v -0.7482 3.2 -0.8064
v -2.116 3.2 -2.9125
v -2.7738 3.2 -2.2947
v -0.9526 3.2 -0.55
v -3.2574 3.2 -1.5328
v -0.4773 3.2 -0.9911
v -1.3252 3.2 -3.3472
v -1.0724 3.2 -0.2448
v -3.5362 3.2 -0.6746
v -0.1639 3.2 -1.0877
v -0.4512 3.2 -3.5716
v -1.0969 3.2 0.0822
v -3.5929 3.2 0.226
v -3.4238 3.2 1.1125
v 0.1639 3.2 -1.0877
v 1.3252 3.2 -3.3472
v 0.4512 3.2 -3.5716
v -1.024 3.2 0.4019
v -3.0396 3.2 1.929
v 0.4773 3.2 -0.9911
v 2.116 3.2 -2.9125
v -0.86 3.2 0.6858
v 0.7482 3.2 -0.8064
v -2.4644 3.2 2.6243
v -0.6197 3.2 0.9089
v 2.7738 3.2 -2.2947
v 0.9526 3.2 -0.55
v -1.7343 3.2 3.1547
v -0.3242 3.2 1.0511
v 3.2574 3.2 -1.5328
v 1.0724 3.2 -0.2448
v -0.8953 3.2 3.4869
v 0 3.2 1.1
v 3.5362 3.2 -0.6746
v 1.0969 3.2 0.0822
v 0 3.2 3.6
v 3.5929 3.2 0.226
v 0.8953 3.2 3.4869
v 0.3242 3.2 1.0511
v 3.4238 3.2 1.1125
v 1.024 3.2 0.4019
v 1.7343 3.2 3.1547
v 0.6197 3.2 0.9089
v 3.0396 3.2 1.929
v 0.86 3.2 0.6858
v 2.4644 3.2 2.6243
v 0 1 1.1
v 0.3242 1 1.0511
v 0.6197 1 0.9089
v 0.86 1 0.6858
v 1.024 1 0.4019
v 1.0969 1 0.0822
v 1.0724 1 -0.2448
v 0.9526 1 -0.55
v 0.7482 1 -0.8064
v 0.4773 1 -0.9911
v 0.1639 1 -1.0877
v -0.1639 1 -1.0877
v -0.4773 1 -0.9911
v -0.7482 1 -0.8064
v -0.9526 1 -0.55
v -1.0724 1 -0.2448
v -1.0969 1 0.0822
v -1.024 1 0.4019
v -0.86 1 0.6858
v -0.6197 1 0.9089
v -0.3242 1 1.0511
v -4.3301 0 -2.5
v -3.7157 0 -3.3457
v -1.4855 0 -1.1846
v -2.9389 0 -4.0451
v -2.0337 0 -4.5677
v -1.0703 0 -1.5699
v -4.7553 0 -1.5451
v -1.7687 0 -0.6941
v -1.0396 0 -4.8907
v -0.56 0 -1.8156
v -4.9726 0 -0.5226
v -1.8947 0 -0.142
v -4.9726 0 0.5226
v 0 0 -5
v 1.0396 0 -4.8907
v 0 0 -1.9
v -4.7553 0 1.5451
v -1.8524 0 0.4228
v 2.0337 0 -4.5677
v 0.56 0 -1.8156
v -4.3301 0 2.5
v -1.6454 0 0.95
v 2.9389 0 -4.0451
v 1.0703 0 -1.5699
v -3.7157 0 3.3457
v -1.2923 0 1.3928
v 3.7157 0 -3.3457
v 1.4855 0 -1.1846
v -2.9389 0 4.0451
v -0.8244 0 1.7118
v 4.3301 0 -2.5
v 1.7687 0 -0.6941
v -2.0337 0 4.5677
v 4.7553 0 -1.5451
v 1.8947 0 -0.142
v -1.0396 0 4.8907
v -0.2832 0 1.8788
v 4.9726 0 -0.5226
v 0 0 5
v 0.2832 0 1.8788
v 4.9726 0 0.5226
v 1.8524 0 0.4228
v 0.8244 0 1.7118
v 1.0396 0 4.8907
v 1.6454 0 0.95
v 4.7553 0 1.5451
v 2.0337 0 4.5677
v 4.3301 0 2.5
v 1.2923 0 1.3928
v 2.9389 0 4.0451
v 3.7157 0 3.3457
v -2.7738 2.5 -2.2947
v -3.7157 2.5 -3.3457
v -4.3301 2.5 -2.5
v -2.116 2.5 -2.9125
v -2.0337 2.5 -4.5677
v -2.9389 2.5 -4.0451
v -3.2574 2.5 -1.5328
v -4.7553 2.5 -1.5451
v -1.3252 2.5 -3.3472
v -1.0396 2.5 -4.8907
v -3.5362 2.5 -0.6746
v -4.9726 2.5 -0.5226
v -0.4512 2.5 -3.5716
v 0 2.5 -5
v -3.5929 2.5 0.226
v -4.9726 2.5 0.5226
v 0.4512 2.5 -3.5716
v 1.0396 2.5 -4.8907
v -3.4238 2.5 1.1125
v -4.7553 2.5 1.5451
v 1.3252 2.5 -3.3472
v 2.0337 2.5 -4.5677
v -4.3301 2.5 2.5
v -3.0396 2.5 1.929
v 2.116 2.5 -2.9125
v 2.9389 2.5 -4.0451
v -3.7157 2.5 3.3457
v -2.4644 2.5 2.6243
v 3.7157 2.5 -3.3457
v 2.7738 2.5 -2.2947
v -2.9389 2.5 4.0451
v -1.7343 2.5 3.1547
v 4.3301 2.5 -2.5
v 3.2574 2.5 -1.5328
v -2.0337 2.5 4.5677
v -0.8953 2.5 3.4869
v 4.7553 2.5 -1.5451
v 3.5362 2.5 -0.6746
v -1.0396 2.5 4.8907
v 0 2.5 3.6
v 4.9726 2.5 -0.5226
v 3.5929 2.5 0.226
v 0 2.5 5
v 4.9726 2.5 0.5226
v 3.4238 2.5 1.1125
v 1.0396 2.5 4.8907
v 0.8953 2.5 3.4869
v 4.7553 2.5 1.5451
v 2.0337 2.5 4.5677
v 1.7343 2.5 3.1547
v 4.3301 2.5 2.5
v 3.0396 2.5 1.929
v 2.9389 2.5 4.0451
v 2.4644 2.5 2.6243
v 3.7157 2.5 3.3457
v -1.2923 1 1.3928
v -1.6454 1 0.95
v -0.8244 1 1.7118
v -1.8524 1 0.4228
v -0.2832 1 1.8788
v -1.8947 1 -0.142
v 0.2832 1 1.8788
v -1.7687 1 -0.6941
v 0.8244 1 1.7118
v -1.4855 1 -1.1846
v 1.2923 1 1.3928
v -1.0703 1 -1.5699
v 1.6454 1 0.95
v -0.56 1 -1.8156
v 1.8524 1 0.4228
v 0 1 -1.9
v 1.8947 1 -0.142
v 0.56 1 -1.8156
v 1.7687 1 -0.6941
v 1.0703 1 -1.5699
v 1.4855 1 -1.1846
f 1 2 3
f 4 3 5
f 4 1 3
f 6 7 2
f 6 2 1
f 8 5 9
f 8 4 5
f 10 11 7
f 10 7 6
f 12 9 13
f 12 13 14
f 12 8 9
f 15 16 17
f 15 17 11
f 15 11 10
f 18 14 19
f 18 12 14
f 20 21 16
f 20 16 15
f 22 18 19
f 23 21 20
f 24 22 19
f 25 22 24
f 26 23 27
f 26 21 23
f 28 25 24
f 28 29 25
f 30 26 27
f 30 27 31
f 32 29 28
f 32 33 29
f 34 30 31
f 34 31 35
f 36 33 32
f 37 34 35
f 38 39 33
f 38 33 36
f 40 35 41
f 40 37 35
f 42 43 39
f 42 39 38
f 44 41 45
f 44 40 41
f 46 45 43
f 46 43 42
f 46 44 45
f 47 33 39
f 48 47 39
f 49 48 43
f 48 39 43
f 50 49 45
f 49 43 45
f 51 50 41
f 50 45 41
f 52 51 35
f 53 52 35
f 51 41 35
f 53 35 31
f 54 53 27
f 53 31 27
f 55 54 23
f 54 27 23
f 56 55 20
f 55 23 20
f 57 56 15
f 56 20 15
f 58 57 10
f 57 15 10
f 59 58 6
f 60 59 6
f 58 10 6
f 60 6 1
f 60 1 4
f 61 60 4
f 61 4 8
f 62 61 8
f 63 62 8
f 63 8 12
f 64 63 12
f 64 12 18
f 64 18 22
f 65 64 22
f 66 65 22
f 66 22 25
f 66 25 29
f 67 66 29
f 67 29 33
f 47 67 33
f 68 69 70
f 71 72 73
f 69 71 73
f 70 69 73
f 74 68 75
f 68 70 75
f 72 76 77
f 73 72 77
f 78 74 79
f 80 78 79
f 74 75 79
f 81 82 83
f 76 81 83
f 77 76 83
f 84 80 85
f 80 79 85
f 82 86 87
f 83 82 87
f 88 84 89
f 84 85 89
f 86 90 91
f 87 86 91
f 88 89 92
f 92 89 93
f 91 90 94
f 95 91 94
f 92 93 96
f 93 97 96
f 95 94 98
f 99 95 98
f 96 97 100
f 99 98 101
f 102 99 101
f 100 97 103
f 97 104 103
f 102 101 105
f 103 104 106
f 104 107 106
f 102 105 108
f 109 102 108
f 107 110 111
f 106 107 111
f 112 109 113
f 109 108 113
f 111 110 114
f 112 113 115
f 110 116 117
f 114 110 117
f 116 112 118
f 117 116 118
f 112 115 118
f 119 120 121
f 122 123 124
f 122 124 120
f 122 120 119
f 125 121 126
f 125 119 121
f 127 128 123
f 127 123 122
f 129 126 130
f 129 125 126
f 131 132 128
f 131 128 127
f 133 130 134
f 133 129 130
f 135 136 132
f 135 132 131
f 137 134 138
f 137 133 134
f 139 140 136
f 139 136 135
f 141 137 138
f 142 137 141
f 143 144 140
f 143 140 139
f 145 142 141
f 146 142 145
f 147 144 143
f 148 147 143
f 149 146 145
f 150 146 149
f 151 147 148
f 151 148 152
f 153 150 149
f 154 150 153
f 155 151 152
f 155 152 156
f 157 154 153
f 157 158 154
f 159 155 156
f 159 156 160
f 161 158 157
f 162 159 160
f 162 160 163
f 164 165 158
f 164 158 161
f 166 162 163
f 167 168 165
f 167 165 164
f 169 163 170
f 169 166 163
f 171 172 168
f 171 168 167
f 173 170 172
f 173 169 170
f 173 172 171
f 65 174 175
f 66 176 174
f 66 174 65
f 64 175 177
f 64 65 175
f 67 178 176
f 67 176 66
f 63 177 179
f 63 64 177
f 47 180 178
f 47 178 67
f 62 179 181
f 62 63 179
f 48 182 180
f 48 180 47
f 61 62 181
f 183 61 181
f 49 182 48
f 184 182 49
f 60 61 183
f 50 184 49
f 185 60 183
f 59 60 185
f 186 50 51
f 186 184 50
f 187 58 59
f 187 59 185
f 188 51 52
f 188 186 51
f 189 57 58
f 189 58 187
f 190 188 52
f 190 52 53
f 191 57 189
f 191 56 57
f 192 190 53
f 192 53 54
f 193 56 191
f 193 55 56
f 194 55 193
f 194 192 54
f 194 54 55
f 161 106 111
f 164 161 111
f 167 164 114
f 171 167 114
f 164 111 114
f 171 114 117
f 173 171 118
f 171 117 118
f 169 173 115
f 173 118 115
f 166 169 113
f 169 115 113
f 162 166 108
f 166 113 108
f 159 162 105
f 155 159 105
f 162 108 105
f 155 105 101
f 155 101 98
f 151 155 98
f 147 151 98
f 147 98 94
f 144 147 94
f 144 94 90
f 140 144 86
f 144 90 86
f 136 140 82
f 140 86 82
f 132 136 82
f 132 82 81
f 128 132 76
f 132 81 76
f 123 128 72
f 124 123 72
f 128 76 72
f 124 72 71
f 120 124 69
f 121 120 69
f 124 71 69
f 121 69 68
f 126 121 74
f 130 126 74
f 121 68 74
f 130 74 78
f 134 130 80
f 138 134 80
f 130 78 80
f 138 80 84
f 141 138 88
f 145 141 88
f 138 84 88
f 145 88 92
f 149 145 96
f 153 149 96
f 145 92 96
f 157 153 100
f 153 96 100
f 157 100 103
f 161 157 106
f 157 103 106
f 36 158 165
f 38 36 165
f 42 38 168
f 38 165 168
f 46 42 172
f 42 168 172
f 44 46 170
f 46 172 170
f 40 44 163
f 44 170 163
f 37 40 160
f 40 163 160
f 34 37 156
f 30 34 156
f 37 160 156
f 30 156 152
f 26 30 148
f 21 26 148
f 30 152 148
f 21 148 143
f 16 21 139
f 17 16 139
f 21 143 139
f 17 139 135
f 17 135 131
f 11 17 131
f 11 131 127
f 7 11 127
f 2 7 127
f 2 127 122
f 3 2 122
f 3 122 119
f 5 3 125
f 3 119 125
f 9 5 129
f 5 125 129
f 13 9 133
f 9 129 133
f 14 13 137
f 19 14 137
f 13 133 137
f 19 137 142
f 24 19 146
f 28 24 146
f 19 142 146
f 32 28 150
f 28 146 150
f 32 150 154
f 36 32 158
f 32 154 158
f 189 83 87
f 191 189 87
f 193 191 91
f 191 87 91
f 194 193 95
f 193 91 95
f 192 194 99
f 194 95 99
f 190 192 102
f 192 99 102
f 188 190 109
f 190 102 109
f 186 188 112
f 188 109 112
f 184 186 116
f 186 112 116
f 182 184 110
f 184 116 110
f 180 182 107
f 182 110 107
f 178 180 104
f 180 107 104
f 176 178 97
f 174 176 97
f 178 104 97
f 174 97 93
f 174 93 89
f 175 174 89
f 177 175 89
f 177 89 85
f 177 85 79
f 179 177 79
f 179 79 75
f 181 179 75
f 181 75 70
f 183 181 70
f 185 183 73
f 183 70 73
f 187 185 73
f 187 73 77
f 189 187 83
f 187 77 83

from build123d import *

# Parameters (mm, degrees)
SKETCH_1_R          = 5
EXTRUDE_1_DEPTH     = 2.5
SKETCH_2_R          = 3.6
EXTRUDE_2_DEPTH     = 0.7
SKETCH_3_R          = 1.1
CUT_EXTRUDE_1_DEPTH = 8.761443165
SKETCH_4_R          = 1.9
CUT_EXTRUDE_2_DEPTH = 1


with BuildPart() as part:
    # 草图1 → 凸台-拉伸1 (new body)
    with BuildSketch(Plane(origin=(0, 0, 0), x_dir=(1, 0, 0), z_dir=(0, 1, 0))):
        with Locations(Location((0, 0, 0), (0, 0, 270))):
            Circle(SKETCH_1_R)
    extrude(amount=EXTRUDE_1_DEPTH)

    # 草图2 → 凸台-拉伸2 (add)
    with BuildSketch(Plane(origin=(0, 2.5, 0), x_dir=(1, 0, 0), z_dir=(0, 1, 0))):
        with Locations(Location((0, 0, 0), (0, 0, 270))):
            Circle(SKETCH_2_R)
    extrude(amount=EXTRUDE_2_DEPTH)

    # 草图3 → 切除-拉伸1 (cut, through all)
    with BuildSketch(Plane(origin=(0, 3.2, 0), x_dir=(1, 0, 0), z_dir=(0, 1, 0))):
        with Locations(Location((0, 0, 0), (0, 0, 270))):
            Circle(SKETCH_3_R)
    extrude(amount=-CUT_EXTRUDE_1_DEPTH, mode=Mode.SUBTRACT)

    # 草图4 → 切除-拉伸2 (cut)
    with BuildSketch(Plane.XZ):
        with Locations(Location((0, 0, 0), (0, 0, 270))):
            Circle(SKETCH_4_R)
    extrude(amount=-CUT_EXTRUDE_2_DEPTH, mode=Mode.SUBTRACT)


solid = part.part
